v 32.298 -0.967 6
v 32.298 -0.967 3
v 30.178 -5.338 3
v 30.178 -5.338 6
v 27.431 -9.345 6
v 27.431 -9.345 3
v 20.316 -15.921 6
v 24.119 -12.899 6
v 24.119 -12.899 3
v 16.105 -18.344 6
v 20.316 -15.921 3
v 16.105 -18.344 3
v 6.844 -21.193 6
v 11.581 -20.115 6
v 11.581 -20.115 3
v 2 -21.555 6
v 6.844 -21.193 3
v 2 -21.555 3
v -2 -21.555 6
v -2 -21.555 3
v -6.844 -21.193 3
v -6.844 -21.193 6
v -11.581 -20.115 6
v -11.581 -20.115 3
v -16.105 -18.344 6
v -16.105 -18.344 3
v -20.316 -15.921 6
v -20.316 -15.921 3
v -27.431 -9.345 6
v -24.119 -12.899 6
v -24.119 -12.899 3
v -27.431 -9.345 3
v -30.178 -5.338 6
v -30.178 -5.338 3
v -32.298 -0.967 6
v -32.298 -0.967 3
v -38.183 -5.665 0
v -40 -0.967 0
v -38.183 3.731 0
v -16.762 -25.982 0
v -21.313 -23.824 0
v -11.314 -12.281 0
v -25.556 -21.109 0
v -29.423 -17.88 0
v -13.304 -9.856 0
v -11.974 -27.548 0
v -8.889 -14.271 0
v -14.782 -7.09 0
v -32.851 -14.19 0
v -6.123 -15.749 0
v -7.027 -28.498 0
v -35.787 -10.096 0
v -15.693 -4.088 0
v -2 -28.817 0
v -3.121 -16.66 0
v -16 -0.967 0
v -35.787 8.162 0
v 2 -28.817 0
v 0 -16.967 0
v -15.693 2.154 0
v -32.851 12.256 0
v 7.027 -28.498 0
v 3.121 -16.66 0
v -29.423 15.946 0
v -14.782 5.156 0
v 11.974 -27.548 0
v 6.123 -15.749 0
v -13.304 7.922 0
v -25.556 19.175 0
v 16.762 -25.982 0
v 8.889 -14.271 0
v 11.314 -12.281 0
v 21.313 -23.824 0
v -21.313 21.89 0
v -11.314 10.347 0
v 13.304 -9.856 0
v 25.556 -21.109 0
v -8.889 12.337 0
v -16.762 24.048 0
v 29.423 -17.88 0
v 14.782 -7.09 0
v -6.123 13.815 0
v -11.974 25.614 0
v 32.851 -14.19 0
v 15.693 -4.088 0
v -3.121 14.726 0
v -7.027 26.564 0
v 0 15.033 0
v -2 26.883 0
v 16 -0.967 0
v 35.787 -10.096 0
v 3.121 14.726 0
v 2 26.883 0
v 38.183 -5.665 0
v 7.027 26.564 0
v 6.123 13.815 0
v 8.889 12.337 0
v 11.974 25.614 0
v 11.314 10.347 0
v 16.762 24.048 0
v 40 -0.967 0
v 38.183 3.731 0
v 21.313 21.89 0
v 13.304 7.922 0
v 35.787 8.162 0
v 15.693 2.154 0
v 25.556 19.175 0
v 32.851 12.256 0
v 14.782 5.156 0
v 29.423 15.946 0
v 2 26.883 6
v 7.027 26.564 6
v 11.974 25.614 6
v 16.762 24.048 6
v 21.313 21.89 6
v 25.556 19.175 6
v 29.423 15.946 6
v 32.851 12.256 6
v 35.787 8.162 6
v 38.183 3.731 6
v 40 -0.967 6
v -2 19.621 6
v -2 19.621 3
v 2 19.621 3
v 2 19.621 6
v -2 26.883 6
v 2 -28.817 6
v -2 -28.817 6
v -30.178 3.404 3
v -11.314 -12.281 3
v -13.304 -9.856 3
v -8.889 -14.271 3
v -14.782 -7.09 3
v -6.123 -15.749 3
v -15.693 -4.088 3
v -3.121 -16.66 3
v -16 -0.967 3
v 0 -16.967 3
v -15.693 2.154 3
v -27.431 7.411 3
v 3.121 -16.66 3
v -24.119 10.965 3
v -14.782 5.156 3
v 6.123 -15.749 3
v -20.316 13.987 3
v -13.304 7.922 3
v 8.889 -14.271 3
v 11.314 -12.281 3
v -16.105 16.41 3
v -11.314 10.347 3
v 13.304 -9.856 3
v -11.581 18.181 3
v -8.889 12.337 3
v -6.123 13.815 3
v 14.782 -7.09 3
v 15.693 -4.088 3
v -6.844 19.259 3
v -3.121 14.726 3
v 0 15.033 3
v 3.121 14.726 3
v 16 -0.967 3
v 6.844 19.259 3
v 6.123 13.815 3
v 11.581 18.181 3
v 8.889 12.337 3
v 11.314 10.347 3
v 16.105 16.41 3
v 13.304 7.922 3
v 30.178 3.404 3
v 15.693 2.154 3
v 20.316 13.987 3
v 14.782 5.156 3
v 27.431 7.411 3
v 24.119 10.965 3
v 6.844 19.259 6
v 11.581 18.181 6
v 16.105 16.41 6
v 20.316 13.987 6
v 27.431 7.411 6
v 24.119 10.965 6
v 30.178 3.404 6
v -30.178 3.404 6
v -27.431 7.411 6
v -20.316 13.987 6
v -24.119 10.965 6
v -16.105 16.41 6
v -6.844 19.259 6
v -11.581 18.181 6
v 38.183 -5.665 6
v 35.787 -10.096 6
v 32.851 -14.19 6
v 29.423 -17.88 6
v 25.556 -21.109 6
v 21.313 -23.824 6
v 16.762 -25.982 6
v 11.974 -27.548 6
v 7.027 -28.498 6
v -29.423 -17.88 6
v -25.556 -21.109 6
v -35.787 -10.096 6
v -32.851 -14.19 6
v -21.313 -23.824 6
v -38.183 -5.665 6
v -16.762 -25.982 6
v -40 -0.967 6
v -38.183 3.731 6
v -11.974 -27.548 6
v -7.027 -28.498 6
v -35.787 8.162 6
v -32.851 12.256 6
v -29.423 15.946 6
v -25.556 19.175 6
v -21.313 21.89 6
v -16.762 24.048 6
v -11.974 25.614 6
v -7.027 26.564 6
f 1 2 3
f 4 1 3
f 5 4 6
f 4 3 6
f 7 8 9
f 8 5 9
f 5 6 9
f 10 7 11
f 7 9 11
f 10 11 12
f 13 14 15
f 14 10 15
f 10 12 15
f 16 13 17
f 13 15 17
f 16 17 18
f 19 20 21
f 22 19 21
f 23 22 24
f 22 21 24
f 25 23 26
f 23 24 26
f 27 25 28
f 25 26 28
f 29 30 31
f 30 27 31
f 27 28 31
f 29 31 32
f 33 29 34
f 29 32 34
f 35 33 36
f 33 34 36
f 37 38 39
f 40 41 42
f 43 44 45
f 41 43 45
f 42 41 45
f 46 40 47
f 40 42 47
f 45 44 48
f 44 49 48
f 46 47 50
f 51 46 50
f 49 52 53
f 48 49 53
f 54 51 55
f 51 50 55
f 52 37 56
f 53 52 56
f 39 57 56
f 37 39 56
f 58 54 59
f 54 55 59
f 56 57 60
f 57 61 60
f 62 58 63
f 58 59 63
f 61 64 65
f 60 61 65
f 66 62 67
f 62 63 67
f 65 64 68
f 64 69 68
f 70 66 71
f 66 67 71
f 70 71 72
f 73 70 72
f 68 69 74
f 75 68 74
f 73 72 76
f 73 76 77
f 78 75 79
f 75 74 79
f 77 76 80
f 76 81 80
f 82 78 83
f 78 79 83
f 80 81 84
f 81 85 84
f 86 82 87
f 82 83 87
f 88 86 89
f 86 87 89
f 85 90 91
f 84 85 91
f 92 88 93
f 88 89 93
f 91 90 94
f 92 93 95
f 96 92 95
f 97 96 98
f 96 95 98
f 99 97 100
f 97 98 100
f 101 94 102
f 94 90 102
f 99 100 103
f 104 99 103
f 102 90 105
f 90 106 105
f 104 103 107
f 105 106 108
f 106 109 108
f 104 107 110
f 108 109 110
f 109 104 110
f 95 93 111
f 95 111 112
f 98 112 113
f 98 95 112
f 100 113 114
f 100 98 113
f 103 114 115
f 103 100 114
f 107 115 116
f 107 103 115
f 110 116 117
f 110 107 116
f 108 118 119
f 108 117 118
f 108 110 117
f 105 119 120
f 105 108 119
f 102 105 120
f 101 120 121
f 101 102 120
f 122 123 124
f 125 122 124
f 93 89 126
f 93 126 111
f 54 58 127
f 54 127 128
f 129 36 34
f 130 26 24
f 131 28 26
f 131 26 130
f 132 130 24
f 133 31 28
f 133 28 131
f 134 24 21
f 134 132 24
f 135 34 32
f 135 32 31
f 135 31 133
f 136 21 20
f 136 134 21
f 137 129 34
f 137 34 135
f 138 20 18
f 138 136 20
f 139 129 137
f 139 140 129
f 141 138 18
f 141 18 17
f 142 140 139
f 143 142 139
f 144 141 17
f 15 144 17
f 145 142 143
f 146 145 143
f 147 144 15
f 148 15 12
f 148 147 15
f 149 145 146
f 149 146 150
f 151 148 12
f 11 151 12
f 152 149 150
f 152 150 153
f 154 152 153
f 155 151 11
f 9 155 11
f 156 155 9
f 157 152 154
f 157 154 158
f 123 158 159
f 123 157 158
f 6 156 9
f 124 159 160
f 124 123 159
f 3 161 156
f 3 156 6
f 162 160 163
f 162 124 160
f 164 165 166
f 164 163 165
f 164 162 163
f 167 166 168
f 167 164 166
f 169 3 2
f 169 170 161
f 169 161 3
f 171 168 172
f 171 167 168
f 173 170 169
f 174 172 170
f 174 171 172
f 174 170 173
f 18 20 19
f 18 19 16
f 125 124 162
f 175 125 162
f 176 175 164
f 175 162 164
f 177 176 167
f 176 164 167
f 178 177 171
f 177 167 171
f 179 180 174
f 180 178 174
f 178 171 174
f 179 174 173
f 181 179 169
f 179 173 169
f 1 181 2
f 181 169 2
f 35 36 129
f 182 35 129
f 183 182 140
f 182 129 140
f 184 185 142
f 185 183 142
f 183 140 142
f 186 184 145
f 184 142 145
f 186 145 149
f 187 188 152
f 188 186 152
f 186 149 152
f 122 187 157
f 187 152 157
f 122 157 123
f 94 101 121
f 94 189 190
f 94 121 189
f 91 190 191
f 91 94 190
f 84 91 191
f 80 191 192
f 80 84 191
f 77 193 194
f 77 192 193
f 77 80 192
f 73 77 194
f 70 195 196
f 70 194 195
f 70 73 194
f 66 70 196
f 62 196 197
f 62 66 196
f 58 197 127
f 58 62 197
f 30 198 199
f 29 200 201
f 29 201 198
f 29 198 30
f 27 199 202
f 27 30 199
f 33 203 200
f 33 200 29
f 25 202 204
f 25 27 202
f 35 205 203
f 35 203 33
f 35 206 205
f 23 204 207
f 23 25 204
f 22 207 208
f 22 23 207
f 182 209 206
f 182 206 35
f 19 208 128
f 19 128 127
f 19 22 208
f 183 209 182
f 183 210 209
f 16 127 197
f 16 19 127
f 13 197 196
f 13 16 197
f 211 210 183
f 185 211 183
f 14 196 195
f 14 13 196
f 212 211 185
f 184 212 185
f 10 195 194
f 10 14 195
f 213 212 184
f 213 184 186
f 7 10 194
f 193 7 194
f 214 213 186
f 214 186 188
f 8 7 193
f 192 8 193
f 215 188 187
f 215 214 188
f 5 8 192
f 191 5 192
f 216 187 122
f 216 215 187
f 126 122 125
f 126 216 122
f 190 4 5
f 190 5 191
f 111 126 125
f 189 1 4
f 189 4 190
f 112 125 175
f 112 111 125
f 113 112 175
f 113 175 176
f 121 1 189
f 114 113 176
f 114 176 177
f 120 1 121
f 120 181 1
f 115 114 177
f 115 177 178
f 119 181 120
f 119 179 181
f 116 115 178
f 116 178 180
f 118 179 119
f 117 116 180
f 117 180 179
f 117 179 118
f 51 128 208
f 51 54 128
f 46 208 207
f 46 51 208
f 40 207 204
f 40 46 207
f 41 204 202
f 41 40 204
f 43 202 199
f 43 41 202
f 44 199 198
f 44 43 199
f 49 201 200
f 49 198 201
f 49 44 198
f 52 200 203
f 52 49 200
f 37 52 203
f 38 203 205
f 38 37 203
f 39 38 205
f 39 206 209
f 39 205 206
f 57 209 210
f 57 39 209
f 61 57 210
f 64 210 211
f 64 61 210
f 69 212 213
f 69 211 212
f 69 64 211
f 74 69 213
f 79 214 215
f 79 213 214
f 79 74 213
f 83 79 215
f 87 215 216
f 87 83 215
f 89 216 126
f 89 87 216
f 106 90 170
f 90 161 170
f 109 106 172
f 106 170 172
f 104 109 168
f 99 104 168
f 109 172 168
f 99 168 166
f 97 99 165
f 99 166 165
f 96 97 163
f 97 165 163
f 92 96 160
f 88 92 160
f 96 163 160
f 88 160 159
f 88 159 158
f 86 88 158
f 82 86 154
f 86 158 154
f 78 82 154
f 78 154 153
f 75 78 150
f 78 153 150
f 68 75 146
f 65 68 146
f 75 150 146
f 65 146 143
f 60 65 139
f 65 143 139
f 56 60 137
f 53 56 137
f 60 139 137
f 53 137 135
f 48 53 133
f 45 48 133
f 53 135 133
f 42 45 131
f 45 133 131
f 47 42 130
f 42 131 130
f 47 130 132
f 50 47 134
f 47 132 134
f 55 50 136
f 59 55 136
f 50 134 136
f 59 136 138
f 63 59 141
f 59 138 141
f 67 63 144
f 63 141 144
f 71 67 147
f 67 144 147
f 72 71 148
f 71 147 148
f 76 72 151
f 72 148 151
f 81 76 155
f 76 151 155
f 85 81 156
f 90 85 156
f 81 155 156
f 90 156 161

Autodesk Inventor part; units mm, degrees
ref_plane "YZ Plane" through (0, 0, 0) normal (1, 0, 0) x (0, 1, 0)
ref_plane "XZ Plane" through (0, 0, 0) normal (0, 1, 0) x (-1, 0, 0)
ref_plane "XY Plane" through (0, 0, 0) normal (0, 0, 1) x (1, 0, 0)
sketch "Sketch1" plane through (0, 0, 0) normal (0, 0, 1) x (1, 0, 0)
  line L0 (-40, 40) -> (40, 40)
  line L1 (40, 40) -> (40, -40)
  line L2 (40, -40) -> (-40, -40)
  line L3 (-40, -40) -> (-40, 40)
  line L4 (-40, 40) -> (40, -40) construction
  line L5 (40, 40) -> (-40, -40) construction
  point P0 (0, 0)
  dimension "d0" = 80
  dimension "d1" = 80
extrude "Extrusion1" add sketch "Sketch1" along normal blind 3
sketch "Sketch2" plane through (0, 0, 3) normal (0, 0, 1) x (1, 0, 0)
  arc A0 (-2, 26.8827) -> (-40, -0.967) centre (-2, -12.967) ccw projected
  arc A1 (40, -0.967) -> (2, 26.8827) centre (2, -12.967) ccw projected
  line L0 (2, 26.8827) -> (-2, 26.8827) projected
  line L1 (-40, -0.967) -> (40, -0.967) construction
  line L2 (40, -40) -> (40, 40) construction
  arc A2 (-2, 26.8827) -> (-40, -0.967) centre (-2, -12.967) ccw construction
  arc A3 (40, -0.967) -> (2, 26.8827) centre (2, -12.967) ccw construction
  arc A4 (-2, 26.8827) -> (-40, -0.967) centre (-2, -12.967) ccw
  arc A5 (40, -0.967) -> (2, 26.8827) centre (2, -12.967) ccw
  line L3 (-2, 26.8827) -> (2, 26.8827)
  arc A6 (-2, 26.8827) -> (-40, -0.967) centre (-2, -12.967) ccw
  arc A7 (40, -0.967) -> (2, 26.8827) centre (2, -12.967) ccw
  line L4 (2, 26.8827) -> (-2, 26.8827)
  arc A8 (-40, -0.967) -> (-2, -28.8167) centre (-2, 11.033) ccw
  arc A9 (2, -28.8167) -> (40, -0.967) centre (2, 11.033) ccw
  line L5 (2, -28.8167) -> (-2, -28.8167)
  line L6 (-40, 40) -> (-40, -40) projected
  line L7 (-40, -0.967) -> (-40, 40)
  line L8 (40, 40) -> (-40, 40) projected
  line L9 (-40, 40) -> (40, 40)
  line L10 (40, 40) -> (40, -0.967)
  line L11 (40, -0.967) -> (40, -40)
  line L12 (-40, -40) -> (40, -40) projected
  line L13 (-40, -40) -> (40, -40)
  line L14 (40, -40) -> (-40, -40)
  point P0 (0, 0)
extrude "Extrusion2" cut sketch "Sketch2" against normal blind 3 contours A0 L6 L8 L10 A1 L0 | A8 L5 A9 L11 L12 L6
sketch "Sketch3" plane through (0, 0, 3) normal (0, 0, 1) x (1, 0, 0)
  circle A0 centre (0, -0.967) radius 16 projected
  point P0 (0, 0)
extrude "Extrusion3" cut sketch "Sketch3" against normal blind 3
sketch "Sketch4" plane through (0, 0, 3) normal (0, 0, 1) x (1, 0, 0)
  arc A0 (-2, 19.6211) -> (-32.2982, -0.967) centre (-2, -12.967) ccw projected
  arc A1 (32.2982, -0.967) -> (2, 19.6211) centre (2, -12.967) ccw projected
  line L0 (-2, 19.6211) -> (2, 19.6211) projected
  arc A2 (-2, 19.6211) -> (-32.2982, -0.967) centre (-2, -12.967) ccw
  arc A3 (32.2982, -0.967) -> (2, 19.6211) centre (2, -12.967) ccw
  line L1 (2, 19.6211) -> (-2, 19.6211)
  line L2 (32.2982, -0.967) -> (-32.2982, -0.967) construction
  arc A4 (-32.2982, -0.967) -> (-2, -21.5551) centre (-2, 11.033) ccw
  arc A5 (2, -21.5551) -> (32.2982, -0.967) centre (2, 11.033) ccw
  line L3 (-2, -21.5551) -> (2, -21.5551)
  arc A6 (-2, 26.8827) -> (-40, -0.967) centre (-2, -12.967) ccw construction
  line L4 (-2, 26.8827) -> (2, 26.8827) construction
  arc A7 (40, -0.967) -> (2, 26.8827) centre (2, -12.967) ccw construction
  arc A8 (-40, -0.967) -> (-2, -28.8167) centre (-2, 11.033) ccw construction
  line L5 (2, -28.8167) -> (-2, -28.8167) construction
  arc A9 (2, -28.8167) -> (35, -11.3053) centre (2, 11.033) ccw construction
  arc A10 (2, -28.8167) -> (40, -0.967) centre (2, 11.033) ccw construction
  arc A11 (-2, 26.8827) -> (-40, -0.967) centre (-2, -12.967) ccw construction
  arc A12 (-2, 26.8827) -> (-40, -0.967) centre (-2, -12.967) ccw
  arc A13 (40, -0.967) -> (2, 26.8827) centre (2, -12.967) ccw
  arc A14 (2, -28.8167) -> (40, -0.967) centre (2, 11.033) ccw
  arc A15 (-40, -0.967) -> (-2, -28.8167) centre (-2, 11.033) ccw
  line L6 (-2, 26.8827) -> (2, 26.8827) projected
  line L7 (-2, 26.8827) -> (2, 26.8827)
  line L8 (2, -28.8167) -> (-2, -28.8167)
  point P0 (0, 0)
extrude "Extrusion4" add sketch "Sketch4" along normal blind 3
